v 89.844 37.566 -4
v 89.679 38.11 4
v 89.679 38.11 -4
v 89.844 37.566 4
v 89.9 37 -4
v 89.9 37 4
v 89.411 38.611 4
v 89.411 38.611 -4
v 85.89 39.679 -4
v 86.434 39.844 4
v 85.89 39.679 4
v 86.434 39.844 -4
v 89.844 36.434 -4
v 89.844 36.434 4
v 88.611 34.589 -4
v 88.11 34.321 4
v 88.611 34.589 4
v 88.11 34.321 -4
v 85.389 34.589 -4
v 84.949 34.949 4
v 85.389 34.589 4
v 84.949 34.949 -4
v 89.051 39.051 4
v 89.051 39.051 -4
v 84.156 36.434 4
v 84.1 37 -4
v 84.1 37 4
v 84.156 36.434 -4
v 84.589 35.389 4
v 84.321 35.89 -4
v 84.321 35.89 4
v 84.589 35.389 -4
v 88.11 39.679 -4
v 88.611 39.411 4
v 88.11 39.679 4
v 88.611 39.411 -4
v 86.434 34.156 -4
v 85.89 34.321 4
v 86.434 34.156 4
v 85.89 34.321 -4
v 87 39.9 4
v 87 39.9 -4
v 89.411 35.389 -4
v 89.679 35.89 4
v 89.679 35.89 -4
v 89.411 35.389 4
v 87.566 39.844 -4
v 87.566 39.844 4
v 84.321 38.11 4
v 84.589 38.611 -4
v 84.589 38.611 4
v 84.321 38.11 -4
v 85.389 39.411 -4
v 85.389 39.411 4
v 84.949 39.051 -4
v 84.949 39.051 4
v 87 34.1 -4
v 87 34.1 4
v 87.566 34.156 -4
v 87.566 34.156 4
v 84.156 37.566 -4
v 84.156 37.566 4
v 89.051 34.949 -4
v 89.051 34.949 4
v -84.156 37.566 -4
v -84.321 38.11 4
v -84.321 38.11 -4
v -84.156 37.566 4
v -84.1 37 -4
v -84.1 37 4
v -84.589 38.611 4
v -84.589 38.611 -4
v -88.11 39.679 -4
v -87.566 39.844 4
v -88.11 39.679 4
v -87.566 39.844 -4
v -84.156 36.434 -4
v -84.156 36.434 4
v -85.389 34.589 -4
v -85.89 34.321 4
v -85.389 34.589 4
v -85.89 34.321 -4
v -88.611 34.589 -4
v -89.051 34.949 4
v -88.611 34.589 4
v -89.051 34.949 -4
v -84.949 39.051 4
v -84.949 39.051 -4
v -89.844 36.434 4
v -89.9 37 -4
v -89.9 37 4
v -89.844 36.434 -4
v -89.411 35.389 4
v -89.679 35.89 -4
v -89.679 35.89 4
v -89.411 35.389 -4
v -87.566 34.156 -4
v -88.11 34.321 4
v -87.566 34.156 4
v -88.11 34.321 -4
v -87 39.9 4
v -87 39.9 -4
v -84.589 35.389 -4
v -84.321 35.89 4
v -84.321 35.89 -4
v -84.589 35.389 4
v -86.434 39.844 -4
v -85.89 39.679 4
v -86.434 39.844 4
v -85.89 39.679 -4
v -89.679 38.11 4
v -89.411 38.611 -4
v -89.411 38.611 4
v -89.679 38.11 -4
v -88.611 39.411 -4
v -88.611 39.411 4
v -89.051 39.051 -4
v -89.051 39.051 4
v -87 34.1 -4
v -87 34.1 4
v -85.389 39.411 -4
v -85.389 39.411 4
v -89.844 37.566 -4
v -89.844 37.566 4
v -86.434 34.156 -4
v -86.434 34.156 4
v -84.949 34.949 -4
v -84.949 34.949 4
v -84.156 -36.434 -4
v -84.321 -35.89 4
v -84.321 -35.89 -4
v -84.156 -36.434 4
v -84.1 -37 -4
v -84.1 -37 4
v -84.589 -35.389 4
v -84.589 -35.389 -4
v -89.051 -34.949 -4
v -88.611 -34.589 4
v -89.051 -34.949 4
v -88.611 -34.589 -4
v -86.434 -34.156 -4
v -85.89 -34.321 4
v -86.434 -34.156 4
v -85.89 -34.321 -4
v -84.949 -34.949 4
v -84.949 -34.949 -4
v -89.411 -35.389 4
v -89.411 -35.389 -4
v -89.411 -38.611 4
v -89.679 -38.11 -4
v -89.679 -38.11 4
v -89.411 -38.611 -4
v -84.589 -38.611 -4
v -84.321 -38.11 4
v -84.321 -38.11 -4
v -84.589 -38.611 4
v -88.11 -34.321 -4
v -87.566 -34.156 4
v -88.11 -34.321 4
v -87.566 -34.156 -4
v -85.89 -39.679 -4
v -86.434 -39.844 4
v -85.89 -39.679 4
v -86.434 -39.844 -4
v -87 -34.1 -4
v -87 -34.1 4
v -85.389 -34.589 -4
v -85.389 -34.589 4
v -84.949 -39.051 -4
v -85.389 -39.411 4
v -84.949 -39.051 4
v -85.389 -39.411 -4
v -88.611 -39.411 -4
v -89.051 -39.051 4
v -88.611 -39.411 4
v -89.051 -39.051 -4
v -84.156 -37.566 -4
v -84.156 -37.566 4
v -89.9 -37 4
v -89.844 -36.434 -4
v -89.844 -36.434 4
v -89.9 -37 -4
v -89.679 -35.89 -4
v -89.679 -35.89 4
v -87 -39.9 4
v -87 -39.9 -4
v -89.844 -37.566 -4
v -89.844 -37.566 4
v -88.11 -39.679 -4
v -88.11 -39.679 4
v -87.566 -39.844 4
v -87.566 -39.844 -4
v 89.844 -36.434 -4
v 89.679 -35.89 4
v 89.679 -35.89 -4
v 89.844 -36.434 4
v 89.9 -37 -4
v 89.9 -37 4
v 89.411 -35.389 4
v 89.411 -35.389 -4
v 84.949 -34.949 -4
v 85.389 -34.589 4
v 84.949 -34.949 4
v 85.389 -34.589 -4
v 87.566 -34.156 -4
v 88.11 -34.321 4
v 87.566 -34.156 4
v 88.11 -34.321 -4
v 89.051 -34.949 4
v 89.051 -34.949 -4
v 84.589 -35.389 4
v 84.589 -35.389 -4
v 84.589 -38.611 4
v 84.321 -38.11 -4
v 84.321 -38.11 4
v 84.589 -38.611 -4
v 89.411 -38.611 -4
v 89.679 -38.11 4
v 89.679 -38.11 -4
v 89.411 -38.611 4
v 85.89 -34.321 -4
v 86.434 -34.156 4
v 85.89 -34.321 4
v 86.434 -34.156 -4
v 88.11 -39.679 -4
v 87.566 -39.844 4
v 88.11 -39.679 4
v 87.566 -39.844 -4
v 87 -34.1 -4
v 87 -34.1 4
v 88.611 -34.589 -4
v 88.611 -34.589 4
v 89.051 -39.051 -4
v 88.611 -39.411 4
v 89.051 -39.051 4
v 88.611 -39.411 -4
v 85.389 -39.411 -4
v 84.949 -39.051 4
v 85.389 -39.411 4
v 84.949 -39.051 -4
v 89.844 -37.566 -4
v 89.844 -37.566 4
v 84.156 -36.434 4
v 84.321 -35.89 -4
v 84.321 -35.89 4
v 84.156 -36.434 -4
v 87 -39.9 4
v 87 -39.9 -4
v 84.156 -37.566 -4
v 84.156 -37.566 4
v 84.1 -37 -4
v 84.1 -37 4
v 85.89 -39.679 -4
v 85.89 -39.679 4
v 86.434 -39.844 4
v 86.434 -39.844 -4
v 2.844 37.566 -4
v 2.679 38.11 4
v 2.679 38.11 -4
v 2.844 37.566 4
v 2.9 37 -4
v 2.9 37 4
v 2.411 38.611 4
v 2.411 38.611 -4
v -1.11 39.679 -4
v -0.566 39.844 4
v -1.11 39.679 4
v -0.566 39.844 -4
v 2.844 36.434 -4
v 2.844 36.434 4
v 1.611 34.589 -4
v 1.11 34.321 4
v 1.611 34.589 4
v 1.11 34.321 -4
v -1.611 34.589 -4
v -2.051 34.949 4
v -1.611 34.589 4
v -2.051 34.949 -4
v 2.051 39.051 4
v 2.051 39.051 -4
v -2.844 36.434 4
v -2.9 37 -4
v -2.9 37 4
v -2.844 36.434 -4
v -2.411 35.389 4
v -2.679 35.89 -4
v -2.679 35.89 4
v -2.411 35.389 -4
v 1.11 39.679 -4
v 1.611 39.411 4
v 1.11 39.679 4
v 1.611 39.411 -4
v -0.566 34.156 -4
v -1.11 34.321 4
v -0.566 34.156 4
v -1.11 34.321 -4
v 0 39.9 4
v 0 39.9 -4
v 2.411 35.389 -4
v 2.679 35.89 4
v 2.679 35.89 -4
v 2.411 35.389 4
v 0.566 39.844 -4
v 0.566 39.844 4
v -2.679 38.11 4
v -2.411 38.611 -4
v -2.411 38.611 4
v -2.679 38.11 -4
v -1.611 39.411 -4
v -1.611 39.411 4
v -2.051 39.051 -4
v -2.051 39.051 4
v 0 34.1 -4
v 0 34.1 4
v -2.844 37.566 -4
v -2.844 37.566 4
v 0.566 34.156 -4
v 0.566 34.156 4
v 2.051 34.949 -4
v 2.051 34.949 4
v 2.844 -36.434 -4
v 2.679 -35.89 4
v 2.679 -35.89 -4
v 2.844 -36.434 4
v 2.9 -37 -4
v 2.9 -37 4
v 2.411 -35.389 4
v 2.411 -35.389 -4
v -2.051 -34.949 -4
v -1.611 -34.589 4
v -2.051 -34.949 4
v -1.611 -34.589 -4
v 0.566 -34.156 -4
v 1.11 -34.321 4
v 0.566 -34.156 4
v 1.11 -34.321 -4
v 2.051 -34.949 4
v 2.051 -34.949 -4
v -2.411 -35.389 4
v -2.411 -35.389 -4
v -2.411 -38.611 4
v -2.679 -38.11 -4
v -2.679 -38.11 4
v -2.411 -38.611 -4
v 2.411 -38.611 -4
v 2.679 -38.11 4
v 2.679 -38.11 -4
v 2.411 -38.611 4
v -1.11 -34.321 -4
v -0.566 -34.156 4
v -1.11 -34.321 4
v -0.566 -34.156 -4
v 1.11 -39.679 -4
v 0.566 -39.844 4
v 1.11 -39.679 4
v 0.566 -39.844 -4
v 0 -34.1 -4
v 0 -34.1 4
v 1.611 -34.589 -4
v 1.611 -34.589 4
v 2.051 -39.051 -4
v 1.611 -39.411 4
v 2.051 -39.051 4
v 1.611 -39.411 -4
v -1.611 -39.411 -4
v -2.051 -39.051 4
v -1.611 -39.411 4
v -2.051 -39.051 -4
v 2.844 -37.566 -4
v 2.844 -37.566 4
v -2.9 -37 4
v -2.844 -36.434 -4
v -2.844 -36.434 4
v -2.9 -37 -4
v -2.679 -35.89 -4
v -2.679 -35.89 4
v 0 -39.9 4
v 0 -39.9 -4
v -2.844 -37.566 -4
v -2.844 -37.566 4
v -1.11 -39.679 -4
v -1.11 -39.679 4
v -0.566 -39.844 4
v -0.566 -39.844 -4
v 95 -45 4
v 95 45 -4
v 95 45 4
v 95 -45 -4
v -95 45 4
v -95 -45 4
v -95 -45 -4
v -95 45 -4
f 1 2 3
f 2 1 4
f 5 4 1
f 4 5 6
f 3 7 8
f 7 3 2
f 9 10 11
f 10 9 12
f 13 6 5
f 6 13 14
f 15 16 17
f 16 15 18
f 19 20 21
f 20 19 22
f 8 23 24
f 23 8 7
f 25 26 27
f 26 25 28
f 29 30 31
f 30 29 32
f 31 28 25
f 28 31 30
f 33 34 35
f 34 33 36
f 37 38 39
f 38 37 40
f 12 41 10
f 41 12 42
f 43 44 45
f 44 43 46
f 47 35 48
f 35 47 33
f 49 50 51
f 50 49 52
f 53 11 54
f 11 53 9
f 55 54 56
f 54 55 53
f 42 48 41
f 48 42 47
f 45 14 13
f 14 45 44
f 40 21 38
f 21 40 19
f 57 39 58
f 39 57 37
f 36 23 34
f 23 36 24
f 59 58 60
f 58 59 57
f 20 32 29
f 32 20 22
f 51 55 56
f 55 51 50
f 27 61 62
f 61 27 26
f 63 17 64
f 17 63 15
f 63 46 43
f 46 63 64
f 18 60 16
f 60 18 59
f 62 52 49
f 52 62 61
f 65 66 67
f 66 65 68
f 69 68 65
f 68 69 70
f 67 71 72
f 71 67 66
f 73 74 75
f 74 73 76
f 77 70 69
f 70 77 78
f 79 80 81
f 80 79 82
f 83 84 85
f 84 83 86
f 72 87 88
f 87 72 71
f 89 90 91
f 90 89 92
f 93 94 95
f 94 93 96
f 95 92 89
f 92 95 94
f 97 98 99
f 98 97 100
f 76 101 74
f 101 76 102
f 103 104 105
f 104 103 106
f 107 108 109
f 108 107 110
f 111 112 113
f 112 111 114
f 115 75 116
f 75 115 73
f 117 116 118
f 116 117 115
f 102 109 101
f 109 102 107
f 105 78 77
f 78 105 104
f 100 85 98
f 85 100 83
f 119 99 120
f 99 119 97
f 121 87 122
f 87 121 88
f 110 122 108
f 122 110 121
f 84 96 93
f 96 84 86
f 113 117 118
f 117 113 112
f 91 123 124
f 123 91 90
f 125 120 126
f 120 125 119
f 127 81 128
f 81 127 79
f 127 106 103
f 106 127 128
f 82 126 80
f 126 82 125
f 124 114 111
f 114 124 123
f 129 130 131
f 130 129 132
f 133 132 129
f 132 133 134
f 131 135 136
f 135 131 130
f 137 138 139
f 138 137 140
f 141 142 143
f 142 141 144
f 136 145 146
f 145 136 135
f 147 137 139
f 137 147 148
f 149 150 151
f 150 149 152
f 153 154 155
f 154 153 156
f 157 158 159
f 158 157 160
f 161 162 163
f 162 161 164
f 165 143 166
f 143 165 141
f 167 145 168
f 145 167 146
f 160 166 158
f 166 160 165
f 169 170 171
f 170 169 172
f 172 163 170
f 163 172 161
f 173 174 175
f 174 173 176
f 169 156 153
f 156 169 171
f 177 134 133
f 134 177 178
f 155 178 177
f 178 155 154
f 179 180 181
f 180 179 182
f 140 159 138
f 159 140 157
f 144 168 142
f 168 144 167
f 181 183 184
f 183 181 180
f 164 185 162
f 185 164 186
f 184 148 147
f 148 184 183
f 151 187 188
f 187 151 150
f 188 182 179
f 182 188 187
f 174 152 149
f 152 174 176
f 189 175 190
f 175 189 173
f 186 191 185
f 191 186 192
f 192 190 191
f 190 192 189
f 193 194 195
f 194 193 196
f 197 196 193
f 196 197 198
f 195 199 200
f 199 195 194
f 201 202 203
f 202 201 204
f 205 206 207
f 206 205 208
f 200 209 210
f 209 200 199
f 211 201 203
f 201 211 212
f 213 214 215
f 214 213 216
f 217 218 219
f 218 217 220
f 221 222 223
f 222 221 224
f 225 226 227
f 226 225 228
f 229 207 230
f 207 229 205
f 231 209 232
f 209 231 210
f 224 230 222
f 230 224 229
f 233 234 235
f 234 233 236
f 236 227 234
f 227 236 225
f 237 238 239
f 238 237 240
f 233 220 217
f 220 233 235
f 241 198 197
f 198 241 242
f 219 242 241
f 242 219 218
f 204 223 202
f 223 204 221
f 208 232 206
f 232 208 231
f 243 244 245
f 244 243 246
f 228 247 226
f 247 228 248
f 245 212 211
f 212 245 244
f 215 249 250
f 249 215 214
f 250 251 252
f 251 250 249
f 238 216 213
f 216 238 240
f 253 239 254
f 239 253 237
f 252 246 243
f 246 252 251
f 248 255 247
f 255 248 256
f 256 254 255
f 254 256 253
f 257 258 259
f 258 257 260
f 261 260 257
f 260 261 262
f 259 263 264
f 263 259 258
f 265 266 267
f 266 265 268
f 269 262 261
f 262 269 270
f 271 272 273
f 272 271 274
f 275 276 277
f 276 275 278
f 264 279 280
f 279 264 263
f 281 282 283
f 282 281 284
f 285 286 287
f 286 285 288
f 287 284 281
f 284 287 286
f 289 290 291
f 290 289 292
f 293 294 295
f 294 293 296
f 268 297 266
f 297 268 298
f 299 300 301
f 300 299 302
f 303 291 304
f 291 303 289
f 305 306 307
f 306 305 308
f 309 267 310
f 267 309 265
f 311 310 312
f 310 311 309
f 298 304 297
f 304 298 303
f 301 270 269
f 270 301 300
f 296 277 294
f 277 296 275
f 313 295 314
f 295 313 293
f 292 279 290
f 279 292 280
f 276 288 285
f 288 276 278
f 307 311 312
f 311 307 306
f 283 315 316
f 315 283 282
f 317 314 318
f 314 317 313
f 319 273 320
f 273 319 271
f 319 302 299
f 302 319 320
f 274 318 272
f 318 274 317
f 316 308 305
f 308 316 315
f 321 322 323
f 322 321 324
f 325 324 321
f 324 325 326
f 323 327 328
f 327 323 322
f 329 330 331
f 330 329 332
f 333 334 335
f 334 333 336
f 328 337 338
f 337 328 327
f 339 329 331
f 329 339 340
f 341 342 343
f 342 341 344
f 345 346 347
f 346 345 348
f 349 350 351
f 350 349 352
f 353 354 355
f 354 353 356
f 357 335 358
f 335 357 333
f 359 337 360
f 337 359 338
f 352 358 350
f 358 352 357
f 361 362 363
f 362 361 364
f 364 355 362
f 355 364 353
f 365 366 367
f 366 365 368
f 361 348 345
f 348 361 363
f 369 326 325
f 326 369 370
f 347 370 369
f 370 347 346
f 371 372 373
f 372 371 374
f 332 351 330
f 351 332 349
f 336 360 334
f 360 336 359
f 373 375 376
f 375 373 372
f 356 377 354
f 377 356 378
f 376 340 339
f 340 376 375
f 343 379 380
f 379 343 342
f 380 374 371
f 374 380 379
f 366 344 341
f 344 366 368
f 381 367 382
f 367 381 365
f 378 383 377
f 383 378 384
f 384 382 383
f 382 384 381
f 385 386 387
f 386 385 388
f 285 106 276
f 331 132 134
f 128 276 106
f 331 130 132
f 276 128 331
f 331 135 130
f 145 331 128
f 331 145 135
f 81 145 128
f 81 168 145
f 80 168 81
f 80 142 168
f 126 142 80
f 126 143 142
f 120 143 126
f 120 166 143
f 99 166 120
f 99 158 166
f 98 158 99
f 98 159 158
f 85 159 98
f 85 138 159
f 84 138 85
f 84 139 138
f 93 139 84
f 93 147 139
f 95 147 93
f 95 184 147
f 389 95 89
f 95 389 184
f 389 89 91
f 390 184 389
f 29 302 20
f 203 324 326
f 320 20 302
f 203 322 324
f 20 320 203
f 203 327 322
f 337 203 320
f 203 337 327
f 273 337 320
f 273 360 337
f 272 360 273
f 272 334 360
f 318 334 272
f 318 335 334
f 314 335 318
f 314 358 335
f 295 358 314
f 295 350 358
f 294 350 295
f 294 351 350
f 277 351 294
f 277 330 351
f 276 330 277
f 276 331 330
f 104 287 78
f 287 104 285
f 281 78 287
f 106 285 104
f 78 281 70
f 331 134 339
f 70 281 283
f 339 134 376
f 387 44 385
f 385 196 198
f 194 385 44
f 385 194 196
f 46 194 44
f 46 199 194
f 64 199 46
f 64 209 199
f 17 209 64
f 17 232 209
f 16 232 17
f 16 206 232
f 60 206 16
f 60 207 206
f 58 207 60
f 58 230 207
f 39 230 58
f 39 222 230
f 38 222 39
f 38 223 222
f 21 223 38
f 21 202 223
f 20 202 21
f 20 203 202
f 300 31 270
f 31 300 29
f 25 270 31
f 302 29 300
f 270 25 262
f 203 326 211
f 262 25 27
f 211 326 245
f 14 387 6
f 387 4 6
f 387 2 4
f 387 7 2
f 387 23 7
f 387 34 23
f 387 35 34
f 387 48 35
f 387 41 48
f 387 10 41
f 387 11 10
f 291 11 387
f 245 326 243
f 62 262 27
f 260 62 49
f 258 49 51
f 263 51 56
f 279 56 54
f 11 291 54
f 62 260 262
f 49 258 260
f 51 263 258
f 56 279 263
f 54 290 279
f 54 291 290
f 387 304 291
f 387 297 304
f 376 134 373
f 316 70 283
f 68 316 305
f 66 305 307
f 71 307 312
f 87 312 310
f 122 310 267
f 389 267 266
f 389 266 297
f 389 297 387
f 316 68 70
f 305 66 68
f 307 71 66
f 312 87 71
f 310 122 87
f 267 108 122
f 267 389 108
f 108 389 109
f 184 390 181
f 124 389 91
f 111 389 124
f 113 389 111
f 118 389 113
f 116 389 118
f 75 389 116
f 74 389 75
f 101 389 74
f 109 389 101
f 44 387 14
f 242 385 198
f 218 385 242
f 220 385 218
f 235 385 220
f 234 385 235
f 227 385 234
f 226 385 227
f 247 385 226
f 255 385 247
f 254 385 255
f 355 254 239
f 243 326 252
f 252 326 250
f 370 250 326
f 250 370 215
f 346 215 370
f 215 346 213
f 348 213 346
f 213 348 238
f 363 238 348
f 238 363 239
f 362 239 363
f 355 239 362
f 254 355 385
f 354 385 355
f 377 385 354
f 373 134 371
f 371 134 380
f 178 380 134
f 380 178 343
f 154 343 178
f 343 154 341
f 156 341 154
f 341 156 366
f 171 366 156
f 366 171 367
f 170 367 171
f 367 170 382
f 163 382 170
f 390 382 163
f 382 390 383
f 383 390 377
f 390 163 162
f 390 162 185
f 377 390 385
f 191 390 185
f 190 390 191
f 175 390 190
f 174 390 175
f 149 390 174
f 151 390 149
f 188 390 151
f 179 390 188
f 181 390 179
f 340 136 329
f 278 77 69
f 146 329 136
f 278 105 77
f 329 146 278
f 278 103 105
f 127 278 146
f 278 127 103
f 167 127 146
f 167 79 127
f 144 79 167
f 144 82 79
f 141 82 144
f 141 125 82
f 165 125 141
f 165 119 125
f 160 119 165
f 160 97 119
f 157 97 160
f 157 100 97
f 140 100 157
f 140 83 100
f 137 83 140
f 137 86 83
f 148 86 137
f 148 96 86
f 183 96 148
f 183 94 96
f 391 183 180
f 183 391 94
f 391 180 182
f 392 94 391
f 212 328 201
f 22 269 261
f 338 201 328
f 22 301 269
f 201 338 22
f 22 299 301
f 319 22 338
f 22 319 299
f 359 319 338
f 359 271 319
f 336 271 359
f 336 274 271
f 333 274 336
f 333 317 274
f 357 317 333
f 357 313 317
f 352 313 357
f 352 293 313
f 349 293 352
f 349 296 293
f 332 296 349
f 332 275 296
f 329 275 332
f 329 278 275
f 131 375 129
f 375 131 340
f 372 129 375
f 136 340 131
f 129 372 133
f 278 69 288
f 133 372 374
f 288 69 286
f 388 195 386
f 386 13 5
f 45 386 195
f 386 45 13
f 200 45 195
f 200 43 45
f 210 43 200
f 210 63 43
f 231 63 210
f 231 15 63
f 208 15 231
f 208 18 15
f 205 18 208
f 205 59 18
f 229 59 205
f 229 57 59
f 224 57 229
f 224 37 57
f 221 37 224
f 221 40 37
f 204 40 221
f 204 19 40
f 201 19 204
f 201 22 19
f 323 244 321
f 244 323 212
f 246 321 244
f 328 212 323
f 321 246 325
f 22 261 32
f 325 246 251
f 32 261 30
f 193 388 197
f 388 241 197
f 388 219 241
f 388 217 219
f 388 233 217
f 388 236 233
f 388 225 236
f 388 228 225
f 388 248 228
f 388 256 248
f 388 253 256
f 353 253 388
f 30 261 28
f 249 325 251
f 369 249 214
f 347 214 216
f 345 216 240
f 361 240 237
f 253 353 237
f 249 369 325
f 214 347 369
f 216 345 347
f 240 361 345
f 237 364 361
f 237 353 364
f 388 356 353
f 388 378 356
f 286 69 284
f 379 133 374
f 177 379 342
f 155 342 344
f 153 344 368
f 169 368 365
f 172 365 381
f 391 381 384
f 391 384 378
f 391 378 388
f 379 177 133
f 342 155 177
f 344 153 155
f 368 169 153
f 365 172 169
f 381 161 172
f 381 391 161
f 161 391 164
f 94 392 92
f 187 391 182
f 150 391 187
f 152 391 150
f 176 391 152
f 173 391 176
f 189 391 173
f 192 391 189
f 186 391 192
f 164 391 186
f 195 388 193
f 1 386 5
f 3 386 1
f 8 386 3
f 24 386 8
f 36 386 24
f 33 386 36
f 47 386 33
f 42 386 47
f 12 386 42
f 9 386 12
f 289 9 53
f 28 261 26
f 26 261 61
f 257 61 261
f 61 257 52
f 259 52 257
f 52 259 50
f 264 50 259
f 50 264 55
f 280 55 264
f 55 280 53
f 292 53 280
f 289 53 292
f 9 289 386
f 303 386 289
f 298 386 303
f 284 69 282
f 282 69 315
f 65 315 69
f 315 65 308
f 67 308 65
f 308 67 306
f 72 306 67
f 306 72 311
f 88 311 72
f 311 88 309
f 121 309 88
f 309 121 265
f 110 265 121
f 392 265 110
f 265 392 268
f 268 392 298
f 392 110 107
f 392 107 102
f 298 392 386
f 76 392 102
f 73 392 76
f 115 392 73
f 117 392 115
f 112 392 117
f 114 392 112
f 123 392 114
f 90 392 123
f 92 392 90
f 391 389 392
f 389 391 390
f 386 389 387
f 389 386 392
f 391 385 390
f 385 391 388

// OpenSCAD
$fn = 32;

// ----------------------------------------------------------------------
// Corner plate 190 x 90 x 8
// 6 holes, centres taken from the edge offset
// ----------------------------------------------------------------------

// --- parameters (mm) ---
plate = [190, 90, 8];   // overall size (x, y, z)
holes = 6;              // number of holes the drawing asks for
bore_d = 5.5;           // nominal hole diameter from the drawing
print_allowance = 0.3;  // clearance added for printing
edge = 8;               // hole centre offset from the plate edge

// --- derived feature positions (mm) ---
hole_d = bore_d + print_allowance;  // = 5.8   hole diameter as printed
corner_x = plate[0] / 2 - edge;     // = 87   corner hole X
corner_y = plate[1] / 2 - edge;     // = 37   corner hole Y
feature_centers = [
  [corner_x, corner_y],
  [-corner_x, corner_y],
  [-corner_x, -corner_y],
  [corner_x, -corner_y],
  [0, corner_y],
  [0, -corner_y]
];   // hole centres the loop below drills

// plate outline, every hole drilled through with the same cutters
difference() {
  cube(plate, center = true);
  for (centre = feature_centers)
    translate([centre[0], centre[1], 0])
      cylinder(d = hole_d, h = plate[2] + 2, center = true);
}
